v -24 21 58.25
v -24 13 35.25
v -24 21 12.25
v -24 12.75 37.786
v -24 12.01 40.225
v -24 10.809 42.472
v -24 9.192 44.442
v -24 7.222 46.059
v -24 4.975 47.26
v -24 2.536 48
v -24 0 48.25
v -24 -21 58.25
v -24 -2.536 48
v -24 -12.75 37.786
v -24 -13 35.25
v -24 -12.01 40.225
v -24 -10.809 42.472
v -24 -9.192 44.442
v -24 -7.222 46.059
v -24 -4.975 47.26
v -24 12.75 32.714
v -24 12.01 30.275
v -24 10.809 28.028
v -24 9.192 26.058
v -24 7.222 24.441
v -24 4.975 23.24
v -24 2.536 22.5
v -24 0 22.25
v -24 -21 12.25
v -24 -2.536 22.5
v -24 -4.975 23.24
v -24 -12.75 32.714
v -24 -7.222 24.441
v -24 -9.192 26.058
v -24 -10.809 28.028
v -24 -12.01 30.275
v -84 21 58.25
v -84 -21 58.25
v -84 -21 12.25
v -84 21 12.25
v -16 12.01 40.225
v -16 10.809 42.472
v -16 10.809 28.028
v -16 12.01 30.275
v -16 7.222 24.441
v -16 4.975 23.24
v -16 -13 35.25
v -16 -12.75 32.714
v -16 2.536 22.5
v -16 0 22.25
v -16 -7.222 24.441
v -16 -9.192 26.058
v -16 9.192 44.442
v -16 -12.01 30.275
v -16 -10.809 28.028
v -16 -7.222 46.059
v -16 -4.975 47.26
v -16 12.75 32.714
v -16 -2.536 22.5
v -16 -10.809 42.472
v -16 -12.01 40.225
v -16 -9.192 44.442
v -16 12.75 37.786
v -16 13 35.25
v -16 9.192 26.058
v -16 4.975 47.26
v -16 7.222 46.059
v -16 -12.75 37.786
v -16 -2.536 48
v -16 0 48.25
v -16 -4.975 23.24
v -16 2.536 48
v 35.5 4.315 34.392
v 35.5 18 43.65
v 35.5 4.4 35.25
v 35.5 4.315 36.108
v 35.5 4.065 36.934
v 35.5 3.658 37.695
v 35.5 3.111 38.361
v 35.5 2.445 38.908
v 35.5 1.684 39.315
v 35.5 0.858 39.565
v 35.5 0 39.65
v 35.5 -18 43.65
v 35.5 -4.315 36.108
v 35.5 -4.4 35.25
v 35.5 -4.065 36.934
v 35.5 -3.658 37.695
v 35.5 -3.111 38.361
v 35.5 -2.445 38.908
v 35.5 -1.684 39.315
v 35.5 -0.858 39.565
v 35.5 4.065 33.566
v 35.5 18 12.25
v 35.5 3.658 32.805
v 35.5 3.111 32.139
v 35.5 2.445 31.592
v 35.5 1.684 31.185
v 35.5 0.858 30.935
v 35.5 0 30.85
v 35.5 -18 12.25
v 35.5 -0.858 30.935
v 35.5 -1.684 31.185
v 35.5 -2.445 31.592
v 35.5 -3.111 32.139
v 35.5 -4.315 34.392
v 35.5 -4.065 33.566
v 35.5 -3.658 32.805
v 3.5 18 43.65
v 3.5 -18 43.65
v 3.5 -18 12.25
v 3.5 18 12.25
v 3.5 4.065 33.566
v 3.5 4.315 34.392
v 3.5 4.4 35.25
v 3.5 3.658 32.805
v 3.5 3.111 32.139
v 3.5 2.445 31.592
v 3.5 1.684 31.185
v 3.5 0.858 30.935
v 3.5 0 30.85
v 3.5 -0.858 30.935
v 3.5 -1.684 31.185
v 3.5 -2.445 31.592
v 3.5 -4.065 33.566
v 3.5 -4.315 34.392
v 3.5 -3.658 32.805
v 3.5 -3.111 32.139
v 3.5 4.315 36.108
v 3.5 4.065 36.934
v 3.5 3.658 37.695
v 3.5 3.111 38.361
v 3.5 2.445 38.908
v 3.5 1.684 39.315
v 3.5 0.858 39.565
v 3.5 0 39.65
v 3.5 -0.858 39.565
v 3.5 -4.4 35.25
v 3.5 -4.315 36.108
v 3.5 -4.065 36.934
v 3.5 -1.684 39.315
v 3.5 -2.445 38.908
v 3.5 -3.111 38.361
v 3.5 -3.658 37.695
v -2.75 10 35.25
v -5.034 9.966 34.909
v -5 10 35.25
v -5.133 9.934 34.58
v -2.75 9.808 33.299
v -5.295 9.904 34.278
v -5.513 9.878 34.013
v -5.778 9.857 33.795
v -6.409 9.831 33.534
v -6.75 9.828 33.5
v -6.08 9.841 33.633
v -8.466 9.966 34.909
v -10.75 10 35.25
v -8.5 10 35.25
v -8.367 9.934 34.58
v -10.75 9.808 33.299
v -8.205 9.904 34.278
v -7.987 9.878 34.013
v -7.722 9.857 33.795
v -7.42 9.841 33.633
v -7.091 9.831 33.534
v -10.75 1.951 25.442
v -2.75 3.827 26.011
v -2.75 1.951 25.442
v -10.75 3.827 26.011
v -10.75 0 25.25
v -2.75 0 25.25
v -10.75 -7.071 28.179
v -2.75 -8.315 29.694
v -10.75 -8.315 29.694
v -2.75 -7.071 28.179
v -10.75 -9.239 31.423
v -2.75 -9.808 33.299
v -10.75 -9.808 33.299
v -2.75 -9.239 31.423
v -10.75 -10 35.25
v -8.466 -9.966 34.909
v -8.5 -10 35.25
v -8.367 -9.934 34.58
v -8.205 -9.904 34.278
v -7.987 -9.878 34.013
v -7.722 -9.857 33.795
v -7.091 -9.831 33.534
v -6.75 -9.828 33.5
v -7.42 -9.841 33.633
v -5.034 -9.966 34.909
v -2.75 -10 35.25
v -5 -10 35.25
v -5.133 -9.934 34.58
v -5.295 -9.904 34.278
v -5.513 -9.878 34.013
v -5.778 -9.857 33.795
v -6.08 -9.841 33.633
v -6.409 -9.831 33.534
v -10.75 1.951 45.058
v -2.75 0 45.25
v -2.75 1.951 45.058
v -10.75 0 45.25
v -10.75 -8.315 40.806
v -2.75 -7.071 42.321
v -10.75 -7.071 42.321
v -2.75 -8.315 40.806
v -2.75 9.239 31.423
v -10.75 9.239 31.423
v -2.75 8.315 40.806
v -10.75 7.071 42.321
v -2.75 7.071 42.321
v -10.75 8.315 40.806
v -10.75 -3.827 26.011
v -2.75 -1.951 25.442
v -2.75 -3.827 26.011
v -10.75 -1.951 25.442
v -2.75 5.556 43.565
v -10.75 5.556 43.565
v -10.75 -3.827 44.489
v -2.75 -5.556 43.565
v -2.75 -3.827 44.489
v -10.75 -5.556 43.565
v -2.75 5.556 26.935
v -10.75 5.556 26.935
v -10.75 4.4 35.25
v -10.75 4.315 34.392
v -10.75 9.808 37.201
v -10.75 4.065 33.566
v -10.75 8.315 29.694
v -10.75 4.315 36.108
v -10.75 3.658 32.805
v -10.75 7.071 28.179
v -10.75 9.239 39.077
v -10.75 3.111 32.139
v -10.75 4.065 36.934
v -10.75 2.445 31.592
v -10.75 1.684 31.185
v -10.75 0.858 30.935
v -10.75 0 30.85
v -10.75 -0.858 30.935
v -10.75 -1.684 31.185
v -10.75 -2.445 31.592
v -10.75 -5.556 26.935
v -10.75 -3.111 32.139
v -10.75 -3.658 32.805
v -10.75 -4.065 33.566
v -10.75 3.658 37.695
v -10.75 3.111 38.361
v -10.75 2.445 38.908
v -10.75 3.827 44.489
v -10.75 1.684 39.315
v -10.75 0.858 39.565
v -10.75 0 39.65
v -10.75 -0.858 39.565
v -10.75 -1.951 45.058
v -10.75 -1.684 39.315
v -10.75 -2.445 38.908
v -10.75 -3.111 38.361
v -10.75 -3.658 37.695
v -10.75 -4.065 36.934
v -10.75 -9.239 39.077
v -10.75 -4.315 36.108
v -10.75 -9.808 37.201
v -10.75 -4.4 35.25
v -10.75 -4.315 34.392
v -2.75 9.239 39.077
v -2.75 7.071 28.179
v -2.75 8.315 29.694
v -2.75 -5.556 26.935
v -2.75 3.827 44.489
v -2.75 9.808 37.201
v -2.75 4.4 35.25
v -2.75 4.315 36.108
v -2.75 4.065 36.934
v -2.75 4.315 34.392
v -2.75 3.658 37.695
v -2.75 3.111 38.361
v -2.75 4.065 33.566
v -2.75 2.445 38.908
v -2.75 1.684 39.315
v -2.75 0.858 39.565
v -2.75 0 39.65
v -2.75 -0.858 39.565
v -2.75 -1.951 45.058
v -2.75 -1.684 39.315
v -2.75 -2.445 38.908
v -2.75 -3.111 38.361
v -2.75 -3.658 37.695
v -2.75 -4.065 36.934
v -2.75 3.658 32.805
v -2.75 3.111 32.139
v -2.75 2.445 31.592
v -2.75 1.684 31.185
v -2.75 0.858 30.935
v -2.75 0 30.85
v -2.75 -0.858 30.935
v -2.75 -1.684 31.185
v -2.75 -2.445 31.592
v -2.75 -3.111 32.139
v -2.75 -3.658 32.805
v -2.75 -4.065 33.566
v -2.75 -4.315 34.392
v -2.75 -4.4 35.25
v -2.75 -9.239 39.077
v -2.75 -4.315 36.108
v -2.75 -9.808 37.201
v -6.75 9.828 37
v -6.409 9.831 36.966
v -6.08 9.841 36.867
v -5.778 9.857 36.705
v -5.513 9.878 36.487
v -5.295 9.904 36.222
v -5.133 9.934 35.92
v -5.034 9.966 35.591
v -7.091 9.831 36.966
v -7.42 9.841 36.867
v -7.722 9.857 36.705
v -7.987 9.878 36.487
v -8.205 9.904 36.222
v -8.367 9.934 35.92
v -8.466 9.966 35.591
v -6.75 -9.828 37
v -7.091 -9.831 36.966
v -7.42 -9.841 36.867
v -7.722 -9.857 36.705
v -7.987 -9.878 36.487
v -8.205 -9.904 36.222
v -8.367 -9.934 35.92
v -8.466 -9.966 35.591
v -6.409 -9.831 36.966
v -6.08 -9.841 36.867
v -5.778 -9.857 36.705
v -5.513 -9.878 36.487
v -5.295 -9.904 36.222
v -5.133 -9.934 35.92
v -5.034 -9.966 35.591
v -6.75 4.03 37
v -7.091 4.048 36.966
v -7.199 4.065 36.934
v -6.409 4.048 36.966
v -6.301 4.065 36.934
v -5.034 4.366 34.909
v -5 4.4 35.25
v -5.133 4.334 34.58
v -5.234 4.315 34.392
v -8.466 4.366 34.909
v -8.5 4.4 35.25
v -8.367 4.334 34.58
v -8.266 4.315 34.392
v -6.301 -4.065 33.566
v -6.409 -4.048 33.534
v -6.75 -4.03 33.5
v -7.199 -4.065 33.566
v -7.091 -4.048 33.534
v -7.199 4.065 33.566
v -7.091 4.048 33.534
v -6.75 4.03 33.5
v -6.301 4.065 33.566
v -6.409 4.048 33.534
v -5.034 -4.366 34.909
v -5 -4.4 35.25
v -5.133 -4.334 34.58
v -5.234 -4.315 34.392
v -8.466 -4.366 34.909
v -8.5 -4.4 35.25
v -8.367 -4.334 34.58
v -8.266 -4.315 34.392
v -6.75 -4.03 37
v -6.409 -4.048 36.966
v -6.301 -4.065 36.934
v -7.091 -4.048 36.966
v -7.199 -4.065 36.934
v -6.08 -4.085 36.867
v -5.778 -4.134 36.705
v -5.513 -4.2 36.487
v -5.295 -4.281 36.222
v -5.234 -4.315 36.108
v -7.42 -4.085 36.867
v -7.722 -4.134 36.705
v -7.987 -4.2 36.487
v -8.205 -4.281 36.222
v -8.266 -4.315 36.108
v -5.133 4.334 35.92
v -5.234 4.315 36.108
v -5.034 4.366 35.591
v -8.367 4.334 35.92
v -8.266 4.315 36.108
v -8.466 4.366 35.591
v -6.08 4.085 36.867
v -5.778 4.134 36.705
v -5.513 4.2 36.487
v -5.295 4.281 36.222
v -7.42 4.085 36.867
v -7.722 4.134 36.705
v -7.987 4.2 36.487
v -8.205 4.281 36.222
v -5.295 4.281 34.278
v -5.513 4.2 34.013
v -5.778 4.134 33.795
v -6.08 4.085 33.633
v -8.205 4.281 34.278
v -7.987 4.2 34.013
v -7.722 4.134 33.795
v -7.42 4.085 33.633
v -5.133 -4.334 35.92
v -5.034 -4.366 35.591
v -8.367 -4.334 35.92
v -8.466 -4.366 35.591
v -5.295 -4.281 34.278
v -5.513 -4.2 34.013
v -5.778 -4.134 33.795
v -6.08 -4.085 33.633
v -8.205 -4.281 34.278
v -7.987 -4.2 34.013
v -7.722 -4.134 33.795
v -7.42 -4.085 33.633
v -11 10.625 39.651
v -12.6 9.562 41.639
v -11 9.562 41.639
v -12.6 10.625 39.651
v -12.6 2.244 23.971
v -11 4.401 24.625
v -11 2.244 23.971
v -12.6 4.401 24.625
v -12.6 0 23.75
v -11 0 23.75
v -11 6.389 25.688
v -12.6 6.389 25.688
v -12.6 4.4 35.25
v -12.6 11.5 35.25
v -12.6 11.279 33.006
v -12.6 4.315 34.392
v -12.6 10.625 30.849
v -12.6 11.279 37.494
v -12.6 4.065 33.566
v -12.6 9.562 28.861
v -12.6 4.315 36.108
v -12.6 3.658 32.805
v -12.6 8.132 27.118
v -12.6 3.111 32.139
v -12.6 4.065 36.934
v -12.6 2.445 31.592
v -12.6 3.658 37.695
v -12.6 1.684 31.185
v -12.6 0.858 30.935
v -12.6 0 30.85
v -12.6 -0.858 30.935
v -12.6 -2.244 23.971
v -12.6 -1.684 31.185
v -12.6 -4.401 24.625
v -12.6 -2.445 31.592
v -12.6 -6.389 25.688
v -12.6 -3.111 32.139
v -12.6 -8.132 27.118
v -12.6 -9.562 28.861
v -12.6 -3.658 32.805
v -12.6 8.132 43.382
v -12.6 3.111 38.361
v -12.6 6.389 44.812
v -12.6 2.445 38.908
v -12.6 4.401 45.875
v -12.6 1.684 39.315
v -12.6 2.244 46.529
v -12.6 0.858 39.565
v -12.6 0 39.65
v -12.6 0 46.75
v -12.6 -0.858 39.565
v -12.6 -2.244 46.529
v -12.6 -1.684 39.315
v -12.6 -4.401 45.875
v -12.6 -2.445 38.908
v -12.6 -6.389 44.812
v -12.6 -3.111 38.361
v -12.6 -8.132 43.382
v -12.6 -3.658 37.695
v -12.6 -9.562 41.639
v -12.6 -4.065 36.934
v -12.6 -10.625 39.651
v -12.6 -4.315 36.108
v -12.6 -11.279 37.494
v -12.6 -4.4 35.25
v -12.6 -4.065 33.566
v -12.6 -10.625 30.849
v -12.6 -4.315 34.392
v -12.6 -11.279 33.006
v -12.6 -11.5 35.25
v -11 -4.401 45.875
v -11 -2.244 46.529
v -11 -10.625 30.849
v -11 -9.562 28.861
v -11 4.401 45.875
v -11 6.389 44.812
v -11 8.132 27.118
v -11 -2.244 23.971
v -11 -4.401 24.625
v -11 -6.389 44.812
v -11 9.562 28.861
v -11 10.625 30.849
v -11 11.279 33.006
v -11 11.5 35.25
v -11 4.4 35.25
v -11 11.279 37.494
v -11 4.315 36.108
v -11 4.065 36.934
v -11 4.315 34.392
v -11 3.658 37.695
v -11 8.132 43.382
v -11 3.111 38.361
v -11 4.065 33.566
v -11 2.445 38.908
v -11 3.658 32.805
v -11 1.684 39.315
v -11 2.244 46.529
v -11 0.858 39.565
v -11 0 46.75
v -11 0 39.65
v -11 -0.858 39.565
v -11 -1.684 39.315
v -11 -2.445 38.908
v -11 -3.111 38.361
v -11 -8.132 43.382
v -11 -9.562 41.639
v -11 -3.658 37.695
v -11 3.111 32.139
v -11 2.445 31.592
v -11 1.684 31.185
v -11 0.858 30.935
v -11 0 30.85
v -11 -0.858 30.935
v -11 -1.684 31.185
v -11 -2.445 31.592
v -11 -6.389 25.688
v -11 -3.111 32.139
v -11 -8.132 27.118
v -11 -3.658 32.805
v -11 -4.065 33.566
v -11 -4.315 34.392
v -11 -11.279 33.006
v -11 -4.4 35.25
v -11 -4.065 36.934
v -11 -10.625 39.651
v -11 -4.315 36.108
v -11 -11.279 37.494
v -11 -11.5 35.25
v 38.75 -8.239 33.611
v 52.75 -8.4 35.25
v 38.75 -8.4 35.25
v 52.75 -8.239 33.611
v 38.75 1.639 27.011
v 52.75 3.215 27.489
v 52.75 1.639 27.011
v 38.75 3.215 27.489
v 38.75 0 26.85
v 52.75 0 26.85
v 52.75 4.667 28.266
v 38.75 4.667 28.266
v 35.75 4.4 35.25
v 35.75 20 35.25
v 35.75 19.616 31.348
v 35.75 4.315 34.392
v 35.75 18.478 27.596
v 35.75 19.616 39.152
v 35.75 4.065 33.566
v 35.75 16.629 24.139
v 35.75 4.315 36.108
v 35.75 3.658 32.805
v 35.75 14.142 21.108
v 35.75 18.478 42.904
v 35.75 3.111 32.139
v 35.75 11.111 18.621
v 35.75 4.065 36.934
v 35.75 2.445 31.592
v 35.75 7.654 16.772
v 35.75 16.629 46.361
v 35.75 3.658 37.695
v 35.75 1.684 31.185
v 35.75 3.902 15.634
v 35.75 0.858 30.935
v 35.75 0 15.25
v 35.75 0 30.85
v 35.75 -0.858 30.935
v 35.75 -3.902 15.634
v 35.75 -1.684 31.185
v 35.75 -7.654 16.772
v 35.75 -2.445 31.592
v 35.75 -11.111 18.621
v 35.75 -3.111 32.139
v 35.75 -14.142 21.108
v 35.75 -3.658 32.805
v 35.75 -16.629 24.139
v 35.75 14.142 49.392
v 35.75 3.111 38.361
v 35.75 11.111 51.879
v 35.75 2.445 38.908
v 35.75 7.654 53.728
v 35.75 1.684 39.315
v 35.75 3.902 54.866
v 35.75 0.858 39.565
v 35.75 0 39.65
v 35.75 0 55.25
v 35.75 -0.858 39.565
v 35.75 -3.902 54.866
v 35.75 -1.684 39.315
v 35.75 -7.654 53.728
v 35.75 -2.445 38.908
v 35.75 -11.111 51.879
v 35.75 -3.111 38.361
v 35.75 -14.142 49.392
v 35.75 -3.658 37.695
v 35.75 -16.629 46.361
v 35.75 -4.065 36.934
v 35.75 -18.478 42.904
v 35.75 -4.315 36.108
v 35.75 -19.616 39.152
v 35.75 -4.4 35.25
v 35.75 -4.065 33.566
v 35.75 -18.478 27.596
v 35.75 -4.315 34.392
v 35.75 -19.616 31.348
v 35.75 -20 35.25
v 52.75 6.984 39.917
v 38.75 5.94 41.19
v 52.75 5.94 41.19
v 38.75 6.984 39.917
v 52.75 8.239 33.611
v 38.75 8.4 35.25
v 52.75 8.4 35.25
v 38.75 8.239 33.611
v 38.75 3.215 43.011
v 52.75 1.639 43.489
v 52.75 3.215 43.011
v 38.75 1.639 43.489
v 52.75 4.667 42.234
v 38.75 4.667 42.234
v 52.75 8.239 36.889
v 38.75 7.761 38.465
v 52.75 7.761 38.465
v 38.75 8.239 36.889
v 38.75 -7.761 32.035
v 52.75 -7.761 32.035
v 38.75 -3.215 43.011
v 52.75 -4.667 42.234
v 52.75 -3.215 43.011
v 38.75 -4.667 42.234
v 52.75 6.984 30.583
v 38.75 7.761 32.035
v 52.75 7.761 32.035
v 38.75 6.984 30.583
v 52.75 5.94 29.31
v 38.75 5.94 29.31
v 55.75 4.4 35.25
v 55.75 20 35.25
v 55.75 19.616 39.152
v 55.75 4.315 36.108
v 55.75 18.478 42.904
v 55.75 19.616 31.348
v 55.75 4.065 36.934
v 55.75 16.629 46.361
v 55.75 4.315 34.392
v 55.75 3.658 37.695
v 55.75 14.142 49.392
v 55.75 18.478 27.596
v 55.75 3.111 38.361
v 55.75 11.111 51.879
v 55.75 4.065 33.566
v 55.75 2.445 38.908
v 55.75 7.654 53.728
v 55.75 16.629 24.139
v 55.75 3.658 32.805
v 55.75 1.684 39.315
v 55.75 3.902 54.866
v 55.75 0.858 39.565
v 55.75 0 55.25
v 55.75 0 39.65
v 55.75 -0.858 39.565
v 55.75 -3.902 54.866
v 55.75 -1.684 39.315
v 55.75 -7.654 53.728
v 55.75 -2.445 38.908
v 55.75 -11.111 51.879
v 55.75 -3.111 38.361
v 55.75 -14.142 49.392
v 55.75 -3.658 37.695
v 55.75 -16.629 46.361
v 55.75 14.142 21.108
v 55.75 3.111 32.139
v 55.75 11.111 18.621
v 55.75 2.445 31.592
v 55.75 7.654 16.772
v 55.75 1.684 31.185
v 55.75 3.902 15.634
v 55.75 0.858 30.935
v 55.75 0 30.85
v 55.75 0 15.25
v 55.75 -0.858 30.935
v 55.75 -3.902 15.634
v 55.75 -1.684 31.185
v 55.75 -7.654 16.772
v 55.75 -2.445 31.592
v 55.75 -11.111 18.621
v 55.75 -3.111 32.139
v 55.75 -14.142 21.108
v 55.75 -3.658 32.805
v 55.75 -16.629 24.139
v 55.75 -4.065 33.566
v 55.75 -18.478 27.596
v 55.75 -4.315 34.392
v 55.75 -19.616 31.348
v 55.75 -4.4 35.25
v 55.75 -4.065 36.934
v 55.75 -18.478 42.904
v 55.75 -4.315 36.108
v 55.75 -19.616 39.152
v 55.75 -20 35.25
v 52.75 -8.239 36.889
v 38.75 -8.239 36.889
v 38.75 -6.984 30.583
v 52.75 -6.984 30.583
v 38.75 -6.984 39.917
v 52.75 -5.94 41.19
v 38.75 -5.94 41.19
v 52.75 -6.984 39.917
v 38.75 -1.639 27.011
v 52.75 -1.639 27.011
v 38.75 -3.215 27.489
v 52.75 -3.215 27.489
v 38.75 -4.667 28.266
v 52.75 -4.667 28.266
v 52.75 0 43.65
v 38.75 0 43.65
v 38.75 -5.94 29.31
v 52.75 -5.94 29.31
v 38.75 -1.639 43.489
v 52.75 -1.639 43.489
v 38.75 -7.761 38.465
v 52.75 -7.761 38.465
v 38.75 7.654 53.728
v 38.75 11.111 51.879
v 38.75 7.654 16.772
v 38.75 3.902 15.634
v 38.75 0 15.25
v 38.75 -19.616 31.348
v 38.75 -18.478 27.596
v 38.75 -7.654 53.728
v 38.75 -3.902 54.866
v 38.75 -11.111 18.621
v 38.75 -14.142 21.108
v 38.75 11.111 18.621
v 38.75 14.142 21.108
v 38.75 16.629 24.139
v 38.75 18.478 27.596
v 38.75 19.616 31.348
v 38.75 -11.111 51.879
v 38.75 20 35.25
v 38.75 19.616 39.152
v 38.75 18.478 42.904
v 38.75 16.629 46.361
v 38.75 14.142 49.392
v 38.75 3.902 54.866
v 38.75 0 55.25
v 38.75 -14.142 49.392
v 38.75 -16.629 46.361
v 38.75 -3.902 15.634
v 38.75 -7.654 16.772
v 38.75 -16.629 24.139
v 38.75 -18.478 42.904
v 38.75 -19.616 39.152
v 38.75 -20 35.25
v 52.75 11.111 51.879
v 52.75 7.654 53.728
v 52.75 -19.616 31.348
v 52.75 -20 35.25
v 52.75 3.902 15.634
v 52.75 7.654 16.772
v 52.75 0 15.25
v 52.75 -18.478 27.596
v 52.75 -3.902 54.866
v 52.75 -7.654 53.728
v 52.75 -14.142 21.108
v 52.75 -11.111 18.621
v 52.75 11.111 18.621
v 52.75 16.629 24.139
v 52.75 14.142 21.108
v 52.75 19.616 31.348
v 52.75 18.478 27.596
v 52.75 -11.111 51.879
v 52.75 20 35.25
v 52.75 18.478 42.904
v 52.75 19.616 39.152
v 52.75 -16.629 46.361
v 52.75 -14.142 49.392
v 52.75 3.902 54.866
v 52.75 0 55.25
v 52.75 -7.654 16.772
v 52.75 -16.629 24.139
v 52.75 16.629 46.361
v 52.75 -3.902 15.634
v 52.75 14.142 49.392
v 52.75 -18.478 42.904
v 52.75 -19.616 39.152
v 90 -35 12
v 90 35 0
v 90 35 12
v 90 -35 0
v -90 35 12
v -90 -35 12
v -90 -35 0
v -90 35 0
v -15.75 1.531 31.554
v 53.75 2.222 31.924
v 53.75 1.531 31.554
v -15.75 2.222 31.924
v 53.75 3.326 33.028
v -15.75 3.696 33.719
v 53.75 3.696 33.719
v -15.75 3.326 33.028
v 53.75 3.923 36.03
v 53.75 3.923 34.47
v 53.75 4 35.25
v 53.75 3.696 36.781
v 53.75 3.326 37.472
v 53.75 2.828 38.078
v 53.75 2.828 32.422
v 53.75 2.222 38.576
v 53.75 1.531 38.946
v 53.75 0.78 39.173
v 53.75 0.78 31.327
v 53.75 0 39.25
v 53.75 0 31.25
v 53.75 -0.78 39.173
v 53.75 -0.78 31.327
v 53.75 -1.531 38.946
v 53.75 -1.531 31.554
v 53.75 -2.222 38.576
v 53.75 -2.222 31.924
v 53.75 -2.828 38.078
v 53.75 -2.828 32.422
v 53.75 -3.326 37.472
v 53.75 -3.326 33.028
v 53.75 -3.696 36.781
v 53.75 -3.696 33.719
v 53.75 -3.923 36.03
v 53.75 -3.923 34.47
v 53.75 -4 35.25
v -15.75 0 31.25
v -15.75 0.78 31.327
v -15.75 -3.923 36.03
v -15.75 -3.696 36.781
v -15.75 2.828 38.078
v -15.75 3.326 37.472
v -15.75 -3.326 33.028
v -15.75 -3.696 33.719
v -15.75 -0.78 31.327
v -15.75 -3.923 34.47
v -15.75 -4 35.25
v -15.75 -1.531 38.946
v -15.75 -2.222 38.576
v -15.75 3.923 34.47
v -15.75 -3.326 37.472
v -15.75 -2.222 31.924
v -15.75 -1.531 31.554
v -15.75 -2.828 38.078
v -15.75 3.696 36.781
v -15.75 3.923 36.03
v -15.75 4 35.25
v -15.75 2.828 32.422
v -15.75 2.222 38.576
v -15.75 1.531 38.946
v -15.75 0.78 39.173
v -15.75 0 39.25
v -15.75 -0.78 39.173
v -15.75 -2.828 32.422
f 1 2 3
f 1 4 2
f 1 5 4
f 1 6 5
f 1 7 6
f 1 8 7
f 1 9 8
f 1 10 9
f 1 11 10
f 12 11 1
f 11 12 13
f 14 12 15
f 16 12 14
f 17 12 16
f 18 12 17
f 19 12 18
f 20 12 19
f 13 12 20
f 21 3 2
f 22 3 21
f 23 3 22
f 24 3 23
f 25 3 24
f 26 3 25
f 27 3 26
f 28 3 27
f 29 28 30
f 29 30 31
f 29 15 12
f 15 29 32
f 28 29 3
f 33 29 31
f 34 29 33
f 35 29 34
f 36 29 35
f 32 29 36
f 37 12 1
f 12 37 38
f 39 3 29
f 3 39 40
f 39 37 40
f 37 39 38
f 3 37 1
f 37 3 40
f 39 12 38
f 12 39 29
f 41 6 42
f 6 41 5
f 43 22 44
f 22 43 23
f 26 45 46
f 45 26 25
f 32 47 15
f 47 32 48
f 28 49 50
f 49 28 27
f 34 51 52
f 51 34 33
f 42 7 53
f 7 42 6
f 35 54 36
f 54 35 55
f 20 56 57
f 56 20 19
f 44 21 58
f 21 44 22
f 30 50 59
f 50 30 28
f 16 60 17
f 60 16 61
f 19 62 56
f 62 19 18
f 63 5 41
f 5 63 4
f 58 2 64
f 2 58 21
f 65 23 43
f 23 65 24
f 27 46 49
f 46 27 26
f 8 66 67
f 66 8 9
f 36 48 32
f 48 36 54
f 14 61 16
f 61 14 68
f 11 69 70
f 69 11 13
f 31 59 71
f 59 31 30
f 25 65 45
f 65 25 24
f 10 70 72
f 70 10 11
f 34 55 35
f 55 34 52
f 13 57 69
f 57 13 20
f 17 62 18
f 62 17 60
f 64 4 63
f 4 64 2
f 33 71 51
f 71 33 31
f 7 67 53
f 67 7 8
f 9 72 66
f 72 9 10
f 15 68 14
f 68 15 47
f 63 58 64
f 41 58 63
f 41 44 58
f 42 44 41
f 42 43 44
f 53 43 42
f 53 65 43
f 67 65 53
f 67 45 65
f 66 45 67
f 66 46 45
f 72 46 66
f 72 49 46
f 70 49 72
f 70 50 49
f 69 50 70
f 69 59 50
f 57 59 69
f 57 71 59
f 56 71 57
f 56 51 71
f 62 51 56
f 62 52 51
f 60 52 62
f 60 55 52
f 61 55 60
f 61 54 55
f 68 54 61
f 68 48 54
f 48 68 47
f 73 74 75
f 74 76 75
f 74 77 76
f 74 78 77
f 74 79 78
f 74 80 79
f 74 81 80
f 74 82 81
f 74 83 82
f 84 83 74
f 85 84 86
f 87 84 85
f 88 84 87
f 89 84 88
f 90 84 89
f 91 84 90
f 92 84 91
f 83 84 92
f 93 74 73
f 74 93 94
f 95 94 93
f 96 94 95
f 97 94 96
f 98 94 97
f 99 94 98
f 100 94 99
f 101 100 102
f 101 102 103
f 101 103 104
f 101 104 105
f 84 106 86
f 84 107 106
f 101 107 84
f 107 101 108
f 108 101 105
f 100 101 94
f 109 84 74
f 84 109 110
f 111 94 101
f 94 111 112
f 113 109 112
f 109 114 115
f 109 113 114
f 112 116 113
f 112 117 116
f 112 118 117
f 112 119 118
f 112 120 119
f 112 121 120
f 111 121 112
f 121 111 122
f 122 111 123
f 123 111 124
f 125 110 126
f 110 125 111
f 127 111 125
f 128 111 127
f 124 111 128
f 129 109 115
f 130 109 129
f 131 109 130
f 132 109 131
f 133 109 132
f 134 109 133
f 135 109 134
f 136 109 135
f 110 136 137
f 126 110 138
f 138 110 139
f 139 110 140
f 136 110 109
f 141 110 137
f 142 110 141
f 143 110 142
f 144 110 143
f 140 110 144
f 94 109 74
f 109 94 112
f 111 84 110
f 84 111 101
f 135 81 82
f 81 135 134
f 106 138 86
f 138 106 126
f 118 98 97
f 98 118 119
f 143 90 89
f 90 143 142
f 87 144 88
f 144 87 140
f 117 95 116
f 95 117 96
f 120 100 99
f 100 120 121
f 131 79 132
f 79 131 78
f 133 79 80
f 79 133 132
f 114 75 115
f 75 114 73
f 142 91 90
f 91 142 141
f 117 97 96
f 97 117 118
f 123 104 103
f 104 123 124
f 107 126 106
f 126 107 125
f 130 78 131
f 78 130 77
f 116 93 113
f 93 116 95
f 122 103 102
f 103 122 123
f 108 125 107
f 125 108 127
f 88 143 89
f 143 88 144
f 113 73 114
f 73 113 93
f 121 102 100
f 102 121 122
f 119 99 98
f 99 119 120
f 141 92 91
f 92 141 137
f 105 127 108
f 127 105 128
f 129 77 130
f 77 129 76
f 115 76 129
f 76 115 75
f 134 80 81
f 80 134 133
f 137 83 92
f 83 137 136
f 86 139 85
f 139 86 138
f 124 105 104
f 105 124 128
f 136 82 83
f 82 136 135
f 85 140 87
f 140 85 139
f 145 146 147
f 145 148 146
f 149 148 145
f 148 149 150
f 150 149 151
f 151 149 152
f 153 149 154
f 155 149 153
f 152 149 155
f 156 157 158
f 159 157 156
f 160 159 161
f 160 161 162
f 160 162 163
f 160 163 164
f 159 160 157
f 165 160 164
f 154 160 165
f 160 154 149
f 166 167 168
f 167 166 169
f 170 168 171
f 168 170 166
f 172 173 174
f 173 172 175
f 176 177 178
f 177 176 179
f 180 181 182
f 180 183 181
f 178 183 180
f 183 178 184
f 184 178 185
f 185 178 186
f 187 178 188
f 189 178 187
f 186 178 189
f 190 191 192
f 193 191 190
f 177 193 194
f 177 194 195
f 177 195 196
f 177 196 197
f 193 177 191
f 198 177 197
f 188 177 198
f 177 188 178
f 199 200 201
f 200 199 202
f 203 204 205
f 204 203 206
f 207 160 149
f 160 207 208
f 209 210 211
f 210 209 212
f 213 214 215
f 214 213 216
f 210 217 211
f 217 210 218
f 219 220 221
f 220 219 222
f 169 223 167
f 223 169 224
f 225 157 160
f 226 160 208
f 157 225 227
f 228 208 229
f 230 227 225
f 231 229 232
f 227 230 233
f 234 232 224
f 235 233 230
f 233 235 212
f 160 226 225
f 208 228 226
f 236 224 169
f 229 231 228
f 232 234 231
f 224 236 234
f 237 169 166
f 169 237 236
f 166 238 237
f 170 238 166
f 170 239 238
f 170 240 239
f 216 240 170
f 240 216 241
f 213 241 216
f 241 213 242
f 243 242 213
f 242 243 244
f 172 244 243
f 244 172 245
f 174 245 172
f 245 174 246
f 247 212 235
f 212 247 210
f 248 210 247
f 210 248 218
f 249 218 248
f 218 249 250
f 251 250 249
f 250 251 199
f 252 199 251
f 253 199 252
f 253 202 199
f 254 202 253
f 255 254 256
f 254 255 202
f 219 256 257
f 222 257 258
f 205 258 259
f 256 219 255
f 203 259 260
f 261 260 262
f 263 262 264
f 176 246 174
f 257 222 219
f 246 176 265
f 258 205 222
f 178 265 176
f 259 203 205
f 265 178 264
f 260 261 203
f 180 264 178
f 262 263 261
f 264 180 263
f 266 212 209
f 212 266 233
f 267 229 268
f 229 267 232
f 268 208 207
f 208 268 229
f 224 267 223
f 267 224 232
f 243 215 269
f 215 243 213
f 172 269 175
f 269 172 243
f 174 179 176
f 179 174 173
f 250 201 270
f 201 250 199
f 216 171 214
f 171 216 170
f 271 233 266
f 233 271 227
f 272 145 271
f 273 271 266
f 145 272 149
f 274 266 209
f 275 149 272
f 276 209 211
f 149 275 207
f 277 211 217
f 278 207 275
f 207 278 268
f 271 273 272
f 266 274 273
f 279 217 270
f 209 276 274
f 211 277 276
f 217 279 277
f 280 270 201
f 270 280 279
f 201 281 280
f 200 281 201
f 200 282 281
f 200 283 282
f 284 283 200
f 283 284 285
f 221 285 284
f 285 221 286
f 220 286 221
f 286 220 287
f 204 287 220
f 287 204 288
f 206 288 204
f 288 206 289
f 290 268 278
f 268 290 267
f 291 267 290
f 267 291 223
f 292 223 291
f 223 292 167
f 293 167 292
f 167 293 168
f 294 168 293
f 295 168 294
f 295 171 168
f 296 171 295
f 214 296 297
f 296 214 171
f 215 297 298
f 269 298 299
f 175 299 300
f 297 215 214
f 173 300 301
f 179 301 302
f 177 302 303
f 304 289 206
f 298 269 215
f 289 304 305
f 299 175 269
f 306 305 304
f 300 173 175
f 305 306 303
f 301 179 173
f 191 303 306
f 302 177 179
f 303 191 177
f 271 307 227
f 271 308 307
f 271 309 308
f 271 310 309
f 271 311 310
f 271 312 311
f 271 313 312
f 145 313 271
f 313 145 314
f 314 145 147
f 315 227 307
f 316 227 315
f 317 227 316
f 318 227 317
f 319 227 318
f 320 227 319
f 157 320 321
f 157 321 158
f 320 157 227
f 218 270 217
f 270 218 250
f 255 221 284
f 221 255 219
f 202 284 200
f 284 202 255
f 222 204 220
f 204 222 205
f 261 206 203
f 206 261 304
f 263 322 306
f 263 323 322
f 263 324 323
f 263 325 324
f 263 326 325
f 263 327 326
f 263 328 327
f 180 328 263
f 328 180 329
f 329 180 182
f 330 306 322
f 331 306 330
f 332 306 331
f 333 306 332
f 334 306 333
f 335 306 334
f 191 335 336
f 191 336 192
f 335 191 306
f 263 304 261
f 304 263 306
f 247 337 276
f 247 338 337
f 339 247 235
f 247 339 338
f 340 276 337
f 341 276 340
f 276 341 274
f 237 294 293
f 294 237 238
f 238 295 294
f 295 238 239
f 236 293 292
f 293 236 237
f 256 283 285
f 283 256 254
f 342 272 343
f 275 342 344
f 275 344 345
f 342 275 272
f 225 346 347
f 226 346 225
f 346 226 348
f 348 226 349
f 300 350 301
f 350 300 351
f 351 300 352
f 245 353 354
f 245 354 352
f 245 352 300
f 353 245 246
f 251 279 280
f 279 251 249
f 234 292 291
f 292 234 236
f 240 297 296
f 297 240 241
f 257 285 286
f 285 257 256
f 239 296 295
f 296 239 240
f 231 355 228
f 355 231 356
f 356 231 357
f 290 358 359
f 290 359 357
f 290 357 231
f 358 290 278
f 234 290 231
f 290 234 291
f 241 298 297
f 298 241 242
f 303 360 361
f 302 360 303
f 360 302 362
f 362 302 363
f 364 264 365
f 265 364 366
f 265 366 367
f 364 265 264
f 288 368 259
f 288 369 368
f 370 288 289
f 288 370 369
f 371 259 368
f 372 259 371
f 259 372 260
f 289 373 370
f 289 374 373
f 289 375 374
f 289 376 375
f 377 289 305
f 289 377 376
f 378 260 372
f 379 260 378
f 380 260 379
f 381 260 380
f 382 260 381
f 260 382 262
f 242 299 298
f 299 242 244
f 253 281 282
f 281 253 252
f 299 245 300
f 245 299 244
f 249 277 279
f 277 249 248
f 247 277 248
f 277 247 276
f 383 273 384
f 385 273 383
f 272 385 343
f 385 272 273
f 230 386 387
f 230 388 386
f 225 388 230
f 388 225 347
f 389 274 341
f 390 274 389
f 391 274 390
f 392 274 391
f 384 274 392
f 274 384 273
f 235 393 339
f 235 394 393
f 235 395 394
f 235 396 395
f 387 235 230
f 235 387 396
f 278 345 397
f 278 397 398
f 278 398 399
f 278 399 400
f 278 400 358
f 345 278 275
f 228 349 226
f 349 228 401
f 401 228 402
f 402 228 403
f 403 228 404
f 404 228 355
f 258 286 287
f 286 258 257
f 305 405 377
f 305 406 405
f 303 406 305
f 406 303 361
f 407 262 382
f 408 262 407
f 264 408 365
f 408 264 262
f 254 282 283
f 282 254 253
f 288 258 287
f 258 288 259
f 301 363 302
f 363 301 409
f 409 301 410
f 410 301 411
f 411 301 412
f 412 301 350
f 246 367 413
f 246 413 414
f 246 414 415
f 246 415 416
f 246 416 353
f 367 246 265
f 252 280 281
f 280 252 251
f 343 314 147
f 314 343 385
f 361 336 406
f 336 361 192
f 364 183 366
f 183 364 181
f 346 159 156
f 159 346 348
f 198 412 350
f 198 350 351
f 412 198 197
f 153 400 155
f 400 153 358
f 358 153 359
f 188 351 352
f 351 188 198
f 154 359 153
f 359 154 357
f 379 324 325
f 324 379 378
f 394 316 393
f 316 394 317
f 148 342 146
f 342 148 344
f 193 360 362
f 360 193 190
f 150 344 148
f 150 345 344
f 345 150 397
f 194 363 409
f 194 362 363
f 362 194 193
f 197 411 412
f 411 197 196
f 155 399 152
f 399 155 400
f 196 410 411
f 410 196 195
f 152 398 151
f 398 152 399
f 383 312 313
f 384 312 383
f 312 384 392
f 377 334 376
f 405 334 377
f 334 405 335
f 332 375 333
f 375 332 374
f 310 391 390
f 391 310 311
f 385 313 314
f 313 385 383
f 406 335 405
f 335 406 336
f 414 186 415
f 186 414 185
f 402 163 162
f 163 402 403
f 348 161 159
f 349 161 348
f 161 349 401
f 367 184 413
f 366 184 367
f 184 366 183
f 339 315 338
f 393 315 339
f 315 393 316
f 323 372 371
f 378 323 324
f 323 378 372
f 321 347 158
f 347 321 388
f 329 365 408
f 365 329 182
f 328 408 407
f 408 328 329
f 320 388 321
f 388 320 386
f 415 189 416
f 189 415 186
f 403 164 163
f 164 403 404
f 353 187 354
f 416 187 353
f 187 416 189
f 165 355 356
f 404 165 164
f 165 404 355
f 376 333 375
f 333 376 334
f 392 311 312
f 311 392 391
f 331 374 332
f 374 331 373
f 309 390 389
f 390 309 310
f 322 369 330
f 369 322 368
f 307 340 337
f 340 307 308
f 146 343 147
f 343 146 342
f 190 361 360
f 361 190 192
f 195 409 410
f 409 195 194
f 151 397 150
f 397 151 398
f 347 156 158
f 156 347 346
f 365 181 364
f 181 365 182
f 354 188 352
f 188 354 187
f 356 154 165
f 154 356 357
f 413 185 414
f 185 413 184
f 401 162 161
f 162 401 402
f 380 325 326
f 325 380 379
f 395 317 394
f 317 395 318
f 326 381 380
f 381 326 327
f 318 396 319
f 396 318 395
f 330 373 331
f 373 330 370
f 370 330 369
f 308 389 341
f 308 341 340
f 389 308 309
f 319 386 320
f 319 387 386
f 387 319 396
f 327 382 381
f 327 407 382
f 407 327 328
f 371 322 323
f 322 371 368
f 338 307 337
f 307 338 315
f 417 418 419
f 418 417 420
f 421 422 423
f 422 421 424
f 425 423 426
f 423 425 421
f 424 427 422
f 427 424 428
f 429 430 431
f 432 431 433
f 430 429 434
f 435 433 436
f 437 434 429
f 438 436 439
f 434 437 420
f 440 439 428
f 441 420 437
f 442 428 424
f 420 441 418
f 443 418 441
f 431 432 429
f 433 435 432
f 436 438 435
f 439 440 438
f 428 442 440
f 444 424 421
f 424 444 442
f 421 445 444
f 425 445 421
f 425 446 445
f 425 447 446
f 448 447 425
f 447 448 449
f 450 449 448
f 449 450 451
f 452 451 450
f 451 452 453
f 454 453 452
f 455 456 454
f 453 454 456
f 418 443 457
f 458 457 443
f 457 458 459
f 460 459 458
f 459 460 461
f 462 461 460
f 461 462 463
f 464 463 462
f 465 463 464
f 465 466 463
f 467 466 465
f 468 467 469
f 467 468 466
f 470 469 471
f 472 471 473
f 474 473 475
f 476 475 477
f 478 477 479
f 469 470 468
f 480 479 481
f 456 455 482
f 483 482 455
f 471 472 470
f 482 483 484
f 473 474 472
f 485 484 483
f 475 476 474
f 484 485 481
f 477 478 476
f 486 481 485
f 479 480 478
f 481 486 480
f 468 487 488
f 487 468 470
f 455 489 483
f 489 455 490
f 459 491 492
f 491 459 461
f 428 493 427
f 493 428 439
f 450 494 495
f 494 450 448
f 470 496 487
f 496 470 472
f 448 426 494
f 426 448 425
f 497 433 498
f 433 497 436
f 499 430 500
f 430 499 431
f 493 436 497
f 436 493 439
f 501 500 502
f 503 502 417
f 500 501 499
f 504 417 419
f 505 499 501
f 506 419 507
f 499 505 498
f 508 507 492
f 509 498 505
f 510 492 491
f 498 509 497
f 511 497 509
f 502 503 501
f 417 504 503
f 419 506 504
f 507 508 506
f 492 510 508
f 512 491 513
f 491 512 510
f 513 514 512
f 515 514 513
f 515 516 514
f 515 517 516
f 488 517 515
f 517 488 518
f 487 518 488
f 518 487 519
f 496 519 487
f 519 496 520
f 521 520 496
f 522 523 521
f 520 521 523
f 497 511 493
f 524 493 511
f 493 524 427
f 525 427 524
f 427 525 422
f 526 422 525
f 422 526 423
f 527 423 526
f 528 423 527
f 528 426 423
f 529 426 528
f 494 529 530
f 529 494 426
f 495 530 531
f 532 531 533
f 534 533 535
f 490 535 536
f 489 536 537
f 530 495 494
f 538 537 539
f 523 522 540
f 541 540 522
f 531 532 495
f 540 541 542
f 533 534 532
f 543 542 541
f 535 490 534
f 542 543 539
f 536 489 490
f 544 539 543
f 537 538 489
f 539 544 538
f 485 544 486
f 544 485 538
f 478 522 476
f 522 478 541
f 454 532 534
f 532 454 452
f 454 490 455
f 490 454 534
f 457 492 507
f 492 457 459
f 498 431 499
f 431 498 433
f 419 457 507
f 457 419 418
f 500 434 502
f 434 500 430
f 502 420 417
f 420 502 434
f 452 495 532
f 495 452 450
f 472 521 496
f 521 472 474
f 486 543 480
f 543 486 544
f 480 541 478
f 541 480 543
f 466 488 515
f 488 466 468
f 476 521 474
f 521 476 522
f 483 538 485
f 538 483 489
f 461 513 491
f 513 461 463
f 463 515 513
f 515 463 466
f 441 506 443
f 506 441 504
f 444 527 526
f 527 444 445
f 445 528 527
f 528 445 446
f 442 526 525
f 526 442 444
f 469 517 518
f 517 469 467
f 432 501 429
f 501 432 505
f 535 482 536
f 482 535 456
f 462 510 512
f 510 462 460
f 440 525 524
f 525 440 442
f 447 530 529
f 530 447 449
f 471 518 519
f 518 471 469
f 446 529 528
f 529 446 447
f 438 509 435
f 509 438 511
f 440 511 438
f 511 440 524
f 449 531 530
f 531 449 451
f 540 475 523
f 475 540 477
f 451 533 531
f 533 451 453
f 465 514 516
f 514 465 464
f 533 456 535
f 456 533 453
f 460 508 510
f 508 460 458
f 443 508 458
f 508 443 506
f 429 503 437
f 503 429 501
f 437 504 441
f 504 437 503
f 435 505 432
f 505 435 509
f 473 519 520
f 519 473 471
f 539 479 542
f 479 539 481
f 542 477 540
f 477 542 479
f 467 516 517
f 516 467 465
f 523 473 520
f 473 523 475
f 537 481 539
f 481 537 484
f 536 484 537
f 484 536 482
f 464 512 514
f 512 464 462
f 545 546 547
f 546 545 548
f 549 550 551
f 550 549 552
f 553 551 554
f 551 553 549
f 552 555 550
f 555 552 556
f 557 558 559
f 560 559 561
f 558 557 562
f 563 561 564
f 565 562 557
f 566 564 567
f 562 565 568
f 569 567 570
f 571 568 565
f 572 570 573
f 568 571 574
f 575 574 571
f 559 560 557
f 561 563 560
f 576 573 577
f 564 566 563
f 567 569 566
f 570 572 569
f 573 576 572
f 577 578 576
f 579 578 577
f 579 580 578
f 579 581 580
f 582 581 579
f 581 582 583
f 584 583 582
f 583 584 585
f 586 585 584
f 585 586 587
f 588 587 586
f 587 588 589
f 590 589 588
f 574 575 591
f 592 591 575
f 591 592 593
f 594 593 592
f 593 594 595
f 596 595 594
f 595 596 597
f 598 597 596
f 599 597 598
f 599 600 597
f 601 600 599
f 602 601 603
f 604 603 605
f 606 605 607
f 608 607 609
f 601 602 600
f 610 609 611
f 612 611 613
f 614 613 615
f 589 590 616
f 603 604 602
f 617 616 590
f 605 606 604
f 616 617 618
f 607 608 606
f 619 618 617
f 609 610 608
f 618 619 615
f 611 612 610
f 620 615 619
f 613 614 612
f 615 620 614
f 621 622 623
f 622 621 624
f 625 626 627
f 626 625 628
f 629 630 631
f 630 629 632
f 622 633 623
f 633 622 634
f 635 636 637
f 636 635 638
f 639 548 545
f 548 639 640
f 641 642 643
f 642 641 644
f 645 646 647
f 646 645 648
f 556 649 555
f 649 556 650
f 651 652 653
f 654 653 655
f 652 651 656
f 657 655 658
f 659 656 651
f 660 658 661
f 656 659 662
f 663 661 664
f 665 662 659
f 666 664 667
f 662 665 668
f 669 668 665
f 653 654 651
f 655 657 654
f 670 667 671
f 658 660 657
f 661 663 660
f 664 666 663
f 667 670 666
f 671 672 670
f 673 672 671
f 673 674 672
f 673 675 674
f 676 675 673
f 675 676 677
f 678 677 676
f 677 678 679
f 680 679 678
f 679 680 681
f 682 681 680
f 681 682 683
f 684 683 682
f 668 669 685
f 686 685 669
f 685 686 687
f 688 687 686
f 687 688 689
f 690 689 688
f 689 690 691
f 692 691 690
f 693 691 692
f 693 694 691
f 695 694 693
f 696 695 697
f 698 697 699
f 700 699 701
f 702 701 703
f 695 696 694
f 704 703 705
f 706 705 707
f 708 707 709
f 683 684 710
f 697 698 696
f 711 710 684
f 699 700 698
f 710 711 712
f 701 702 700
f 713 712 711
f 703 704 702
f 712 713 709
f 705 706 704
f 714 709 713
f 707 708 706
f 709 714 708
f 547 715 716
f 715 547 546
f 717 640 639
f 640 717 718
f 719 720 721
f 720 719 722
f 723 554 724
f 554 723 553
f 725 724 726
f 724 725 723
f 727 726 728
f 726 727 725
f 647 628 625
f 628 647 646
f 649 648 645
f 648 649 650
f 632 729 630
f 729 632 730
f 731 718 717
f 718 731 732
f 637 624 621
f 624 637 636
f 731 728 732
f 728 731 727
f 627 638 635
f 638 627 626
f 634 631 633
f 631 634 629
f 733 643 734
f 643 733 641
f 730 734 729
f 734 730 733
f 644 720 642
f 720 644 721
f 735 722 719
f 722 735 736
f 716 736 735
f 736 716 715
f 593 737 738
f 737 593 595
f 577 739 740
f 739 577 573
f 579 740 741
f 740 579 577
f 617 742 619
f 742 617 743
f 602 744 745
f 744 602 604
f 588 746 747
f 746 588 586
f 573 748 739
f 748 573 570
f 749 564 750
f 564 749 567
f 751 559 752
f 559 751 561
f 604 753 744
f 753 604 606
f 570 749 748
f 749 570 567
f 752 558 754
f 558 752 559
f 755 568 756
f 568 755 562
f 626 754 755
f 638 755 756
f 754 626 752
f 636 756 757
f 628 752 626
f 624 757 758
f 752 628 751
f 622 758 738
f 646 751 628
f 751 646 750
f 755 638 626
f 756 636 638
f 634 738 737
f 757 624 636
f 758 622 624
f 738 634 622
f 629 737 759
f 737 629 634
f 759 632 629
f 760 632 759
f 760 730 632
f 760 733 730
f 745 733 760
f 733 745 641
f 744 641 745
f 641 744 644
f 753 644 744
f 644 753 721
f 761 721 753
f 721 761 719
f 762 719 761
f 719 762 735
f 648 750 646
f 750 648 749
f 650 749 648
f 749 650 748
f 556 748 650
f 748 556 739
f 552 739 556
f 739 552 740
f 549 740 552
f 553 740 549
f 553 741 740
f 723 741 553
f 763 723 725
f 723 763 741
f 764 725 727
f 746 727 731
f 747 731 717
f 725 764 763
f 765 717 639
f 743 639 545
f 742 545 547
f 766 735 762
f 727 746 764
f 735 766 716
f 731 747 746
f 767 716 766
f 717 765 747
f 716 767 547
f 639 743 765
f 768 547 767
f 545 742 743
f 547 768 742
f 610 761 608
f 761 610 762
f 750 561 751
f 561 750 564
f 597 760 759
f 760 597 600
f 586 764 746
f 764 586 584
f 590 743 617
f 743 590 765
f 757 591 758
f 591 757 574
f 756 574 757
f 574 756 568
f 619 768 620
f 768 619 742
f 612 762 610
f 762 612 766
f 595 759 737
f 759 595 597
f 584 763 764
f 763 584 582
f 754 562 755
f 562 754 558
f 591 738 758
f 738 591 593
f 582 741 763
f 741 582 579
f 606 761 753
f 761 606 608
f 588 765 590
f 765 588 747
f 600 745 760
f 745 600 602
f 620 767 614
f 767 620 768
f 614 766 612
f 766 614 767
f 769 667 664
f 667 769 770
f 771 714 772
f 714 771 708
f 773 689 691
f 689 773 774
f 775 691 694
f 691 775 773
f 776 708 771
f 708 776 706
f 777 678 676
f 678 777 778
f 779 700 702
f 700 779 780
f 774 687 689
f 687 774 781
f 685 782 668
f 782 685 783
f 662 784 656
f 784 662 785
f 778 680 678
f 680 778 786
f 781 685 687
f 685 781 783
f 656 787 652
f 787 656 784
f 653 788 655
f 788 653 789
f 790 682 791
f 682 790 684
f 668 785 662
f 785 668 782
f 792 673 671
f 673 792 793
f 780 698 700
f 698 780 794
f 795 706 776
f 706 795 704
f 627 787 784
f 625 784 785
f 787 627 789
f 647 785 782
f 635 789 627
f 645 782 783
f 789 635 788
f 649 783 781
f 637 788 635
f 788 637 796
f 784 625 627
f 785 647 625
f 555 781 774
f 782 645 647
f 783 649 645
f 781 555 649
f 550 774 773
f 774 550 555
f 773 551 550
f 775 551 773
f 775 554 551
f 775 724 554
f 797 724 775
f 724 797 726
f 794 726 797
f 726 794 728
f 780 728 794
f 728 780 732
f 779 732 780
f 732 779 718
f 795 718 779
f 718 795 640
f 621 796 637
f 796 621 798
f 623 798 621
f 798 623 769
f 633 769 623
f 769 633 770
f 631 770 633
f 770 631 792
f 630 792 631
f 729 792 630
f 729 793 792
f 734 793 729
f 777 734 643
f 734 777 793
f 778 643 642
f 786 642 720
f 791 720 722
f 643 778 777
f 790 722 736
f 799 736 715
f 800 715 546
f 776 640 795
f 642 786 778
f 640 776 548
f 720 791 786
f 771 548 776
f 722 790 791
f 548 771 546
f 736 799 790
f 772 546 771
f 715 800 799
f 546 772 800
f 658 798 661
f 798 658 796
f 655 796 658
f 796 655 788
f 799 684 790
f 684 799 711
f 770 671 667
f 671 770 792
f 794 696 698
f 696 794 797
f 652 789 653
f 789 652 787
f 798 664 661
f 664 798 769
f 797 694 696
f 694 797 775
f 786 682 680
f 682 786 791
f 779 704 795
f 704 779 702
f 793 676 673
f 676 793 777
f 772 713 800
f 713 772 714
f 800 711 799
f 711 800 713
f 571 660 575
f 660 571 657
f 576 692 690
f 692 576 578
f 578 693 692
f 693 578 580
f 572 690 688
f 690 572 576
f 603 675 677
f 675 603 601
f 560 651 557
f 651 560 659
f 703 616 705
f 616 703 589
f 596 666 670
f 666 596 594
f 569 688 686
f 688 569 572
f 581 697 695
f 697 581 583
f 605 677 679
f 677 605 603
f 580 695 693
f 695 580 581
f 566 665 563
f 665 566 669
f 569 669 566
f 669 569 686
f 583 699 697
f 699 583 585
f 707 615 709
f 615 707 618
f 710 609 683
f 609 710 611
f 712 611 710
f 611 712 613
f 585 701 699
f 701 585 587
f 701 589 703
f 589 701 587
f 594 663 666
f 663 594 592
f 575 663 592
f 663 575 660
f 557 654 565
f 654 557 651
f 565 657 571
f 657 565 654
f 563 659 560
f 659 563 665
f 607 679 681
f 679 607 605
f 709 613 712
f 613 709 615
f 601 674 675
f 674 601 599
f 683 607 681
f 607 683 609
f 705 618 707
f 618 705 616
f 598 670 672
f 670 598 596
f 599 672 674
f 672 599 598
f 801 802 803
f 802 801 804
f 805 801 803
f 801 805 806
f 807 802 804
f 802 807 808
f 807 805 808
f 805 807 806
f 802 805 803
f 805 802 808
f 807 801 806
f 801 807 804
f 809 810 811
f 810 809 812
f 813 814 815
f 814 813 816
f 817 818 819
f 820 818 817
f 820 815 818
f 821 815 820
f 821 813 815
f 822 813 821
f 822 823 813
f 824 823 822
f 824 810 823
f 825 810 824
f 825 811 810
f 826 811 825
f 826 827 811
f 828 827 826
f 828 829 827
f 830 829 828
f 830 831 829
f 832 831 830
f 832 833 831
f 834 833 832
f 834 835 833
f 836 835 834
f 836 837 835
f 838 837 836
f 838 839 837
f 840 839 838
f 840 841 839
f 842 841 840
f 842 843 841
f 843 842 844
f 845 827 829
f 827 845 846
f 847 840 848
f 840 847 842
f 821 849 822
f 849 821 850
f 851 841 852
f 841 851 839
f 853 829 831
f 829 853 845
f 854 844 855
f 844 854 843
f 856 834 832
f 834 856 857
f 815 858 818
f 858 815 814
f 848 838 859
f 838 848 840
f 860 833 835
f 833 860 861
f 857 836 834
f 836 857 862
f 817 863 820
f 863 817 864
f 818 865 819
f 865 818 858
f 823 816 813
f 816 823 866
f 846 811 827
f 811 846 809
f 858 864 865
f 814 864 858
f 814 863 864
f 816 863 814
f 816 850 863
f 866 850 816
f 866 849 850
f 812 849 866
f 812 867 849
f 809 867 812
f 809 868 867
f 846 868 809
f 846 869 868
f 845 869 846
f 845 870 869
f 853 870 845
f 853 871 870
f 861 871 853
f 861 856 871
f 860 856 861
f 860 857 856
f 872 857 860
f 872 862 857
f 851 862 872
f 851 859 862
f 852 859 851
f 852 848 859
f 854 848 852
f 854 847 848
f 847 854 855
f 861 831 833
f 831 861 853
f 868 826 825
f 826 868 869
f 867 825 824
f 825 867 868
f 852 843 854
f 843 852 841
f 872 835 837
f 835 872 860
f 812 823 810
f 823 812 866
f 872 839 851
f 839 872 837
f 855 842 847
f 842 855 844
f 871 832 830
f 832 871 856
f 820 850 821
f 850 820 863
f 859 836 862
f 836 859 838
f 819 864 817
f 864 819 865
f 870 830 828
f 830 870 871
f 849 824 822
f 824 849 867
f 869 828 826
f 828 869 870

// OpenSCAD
$fn = 32;

// ------------------------------------------------------------------------
// Motor drive station: motor 60 x 46 mm, shaft d8, pulley d40
// Every part is its own module, assembly() places every instance.
// ------------------------------------------------------------------------

// --- part 1 ---
module station_bed() {
  difference() {
    translate([-90, -35, 0]) cube([180, 70, 12]);
  }
}

// --- part 2 ---
module drive_motor() {
  union() {
    translate([-30, -21, 0]) cube([60, 42, 46]);
    translate([34, 0, 23]) rotate([0, 90, 0]) cylinder(h = 8, d = 26, center = true);
  }
}

// --- part 3 ---
module pillow_block() {
  difference() {
    translate([-16, -18, 0]) cube([32, 36, 31.4]);
    translate([0, 0, 23]) rotate([0, 90, 0]) cylinder(h = 34, d = 8.8, center = true);
  }
}

// --- part 4 ---
module drive_shaft() {
  translate([0, 0, -34.75]) cylinder(h = 69.5, d = 8);
}

// --- part 5 ---
module shaft_collar() {
  difference() {
    cylinder(h = 8, d = 20);
    translate([0, 0, -1]) cylinder(h = 10, d = 8.8);
    translate([0, 0, 4]) rotate([90, 0, 0]) cylinder(h = 22, d = 3.5, center = true);
  }
}

// --- part 6 ---
module collar_washer() {
  difference() {
      translate([0, 0, 0]) cylinder(h = 1.6, d = 23);
      translate([0, 0, -1]) cylinder(h = 3.6, d = 8.8);
    }
}

// --- part 7 ---
module drive_pulley() {
  difference() {
    union() {
      cylinder(h = 20, d = 16.8);
      cylinder(h = 3, d = 40);
      translate([0, 0, 17]) cylinder(h = 3, d = 40);
    }
    translate([0, 0, -1]) cylinder(h = 22, d = 8.8);
  }
}

// --- assembly ---
module assembly() {
  color([0.80, 0.24, 0.20]) translate([0, 0, 0]) rotate([0, 0, 0]) station_bed();
  color([0.20, 0.45, 0.75]) translate([-54, 0, 12.25]) rotate([0, 0, 0]) drive_motor();
  color([0.25, 0.62, 0.32]) translate([19.5, 0, 12.25]) rotate([0, 0, 0]) pillow_block();
  color([0.92, 0.70, 0.18]) translate([19, 0, 35.25]) rotate([0, 90, 0]) drive_shaft();
  color([0.58, 0.35, 0.70]) translate([-10.75, 0, 35.25]) rotate([0, 90, 0]) shaft_collar();
  color([0.16, 0.66, 0.66]) translate([-12.6, 0, 35.25]) rotate([0, 90, 0]) collar_washer();
  color([0.85, 0.48, 0.18]) translate([35.75, 0, 35.25]) rotate([0, 90, 0]) drive_pulley();
}

assembly();
